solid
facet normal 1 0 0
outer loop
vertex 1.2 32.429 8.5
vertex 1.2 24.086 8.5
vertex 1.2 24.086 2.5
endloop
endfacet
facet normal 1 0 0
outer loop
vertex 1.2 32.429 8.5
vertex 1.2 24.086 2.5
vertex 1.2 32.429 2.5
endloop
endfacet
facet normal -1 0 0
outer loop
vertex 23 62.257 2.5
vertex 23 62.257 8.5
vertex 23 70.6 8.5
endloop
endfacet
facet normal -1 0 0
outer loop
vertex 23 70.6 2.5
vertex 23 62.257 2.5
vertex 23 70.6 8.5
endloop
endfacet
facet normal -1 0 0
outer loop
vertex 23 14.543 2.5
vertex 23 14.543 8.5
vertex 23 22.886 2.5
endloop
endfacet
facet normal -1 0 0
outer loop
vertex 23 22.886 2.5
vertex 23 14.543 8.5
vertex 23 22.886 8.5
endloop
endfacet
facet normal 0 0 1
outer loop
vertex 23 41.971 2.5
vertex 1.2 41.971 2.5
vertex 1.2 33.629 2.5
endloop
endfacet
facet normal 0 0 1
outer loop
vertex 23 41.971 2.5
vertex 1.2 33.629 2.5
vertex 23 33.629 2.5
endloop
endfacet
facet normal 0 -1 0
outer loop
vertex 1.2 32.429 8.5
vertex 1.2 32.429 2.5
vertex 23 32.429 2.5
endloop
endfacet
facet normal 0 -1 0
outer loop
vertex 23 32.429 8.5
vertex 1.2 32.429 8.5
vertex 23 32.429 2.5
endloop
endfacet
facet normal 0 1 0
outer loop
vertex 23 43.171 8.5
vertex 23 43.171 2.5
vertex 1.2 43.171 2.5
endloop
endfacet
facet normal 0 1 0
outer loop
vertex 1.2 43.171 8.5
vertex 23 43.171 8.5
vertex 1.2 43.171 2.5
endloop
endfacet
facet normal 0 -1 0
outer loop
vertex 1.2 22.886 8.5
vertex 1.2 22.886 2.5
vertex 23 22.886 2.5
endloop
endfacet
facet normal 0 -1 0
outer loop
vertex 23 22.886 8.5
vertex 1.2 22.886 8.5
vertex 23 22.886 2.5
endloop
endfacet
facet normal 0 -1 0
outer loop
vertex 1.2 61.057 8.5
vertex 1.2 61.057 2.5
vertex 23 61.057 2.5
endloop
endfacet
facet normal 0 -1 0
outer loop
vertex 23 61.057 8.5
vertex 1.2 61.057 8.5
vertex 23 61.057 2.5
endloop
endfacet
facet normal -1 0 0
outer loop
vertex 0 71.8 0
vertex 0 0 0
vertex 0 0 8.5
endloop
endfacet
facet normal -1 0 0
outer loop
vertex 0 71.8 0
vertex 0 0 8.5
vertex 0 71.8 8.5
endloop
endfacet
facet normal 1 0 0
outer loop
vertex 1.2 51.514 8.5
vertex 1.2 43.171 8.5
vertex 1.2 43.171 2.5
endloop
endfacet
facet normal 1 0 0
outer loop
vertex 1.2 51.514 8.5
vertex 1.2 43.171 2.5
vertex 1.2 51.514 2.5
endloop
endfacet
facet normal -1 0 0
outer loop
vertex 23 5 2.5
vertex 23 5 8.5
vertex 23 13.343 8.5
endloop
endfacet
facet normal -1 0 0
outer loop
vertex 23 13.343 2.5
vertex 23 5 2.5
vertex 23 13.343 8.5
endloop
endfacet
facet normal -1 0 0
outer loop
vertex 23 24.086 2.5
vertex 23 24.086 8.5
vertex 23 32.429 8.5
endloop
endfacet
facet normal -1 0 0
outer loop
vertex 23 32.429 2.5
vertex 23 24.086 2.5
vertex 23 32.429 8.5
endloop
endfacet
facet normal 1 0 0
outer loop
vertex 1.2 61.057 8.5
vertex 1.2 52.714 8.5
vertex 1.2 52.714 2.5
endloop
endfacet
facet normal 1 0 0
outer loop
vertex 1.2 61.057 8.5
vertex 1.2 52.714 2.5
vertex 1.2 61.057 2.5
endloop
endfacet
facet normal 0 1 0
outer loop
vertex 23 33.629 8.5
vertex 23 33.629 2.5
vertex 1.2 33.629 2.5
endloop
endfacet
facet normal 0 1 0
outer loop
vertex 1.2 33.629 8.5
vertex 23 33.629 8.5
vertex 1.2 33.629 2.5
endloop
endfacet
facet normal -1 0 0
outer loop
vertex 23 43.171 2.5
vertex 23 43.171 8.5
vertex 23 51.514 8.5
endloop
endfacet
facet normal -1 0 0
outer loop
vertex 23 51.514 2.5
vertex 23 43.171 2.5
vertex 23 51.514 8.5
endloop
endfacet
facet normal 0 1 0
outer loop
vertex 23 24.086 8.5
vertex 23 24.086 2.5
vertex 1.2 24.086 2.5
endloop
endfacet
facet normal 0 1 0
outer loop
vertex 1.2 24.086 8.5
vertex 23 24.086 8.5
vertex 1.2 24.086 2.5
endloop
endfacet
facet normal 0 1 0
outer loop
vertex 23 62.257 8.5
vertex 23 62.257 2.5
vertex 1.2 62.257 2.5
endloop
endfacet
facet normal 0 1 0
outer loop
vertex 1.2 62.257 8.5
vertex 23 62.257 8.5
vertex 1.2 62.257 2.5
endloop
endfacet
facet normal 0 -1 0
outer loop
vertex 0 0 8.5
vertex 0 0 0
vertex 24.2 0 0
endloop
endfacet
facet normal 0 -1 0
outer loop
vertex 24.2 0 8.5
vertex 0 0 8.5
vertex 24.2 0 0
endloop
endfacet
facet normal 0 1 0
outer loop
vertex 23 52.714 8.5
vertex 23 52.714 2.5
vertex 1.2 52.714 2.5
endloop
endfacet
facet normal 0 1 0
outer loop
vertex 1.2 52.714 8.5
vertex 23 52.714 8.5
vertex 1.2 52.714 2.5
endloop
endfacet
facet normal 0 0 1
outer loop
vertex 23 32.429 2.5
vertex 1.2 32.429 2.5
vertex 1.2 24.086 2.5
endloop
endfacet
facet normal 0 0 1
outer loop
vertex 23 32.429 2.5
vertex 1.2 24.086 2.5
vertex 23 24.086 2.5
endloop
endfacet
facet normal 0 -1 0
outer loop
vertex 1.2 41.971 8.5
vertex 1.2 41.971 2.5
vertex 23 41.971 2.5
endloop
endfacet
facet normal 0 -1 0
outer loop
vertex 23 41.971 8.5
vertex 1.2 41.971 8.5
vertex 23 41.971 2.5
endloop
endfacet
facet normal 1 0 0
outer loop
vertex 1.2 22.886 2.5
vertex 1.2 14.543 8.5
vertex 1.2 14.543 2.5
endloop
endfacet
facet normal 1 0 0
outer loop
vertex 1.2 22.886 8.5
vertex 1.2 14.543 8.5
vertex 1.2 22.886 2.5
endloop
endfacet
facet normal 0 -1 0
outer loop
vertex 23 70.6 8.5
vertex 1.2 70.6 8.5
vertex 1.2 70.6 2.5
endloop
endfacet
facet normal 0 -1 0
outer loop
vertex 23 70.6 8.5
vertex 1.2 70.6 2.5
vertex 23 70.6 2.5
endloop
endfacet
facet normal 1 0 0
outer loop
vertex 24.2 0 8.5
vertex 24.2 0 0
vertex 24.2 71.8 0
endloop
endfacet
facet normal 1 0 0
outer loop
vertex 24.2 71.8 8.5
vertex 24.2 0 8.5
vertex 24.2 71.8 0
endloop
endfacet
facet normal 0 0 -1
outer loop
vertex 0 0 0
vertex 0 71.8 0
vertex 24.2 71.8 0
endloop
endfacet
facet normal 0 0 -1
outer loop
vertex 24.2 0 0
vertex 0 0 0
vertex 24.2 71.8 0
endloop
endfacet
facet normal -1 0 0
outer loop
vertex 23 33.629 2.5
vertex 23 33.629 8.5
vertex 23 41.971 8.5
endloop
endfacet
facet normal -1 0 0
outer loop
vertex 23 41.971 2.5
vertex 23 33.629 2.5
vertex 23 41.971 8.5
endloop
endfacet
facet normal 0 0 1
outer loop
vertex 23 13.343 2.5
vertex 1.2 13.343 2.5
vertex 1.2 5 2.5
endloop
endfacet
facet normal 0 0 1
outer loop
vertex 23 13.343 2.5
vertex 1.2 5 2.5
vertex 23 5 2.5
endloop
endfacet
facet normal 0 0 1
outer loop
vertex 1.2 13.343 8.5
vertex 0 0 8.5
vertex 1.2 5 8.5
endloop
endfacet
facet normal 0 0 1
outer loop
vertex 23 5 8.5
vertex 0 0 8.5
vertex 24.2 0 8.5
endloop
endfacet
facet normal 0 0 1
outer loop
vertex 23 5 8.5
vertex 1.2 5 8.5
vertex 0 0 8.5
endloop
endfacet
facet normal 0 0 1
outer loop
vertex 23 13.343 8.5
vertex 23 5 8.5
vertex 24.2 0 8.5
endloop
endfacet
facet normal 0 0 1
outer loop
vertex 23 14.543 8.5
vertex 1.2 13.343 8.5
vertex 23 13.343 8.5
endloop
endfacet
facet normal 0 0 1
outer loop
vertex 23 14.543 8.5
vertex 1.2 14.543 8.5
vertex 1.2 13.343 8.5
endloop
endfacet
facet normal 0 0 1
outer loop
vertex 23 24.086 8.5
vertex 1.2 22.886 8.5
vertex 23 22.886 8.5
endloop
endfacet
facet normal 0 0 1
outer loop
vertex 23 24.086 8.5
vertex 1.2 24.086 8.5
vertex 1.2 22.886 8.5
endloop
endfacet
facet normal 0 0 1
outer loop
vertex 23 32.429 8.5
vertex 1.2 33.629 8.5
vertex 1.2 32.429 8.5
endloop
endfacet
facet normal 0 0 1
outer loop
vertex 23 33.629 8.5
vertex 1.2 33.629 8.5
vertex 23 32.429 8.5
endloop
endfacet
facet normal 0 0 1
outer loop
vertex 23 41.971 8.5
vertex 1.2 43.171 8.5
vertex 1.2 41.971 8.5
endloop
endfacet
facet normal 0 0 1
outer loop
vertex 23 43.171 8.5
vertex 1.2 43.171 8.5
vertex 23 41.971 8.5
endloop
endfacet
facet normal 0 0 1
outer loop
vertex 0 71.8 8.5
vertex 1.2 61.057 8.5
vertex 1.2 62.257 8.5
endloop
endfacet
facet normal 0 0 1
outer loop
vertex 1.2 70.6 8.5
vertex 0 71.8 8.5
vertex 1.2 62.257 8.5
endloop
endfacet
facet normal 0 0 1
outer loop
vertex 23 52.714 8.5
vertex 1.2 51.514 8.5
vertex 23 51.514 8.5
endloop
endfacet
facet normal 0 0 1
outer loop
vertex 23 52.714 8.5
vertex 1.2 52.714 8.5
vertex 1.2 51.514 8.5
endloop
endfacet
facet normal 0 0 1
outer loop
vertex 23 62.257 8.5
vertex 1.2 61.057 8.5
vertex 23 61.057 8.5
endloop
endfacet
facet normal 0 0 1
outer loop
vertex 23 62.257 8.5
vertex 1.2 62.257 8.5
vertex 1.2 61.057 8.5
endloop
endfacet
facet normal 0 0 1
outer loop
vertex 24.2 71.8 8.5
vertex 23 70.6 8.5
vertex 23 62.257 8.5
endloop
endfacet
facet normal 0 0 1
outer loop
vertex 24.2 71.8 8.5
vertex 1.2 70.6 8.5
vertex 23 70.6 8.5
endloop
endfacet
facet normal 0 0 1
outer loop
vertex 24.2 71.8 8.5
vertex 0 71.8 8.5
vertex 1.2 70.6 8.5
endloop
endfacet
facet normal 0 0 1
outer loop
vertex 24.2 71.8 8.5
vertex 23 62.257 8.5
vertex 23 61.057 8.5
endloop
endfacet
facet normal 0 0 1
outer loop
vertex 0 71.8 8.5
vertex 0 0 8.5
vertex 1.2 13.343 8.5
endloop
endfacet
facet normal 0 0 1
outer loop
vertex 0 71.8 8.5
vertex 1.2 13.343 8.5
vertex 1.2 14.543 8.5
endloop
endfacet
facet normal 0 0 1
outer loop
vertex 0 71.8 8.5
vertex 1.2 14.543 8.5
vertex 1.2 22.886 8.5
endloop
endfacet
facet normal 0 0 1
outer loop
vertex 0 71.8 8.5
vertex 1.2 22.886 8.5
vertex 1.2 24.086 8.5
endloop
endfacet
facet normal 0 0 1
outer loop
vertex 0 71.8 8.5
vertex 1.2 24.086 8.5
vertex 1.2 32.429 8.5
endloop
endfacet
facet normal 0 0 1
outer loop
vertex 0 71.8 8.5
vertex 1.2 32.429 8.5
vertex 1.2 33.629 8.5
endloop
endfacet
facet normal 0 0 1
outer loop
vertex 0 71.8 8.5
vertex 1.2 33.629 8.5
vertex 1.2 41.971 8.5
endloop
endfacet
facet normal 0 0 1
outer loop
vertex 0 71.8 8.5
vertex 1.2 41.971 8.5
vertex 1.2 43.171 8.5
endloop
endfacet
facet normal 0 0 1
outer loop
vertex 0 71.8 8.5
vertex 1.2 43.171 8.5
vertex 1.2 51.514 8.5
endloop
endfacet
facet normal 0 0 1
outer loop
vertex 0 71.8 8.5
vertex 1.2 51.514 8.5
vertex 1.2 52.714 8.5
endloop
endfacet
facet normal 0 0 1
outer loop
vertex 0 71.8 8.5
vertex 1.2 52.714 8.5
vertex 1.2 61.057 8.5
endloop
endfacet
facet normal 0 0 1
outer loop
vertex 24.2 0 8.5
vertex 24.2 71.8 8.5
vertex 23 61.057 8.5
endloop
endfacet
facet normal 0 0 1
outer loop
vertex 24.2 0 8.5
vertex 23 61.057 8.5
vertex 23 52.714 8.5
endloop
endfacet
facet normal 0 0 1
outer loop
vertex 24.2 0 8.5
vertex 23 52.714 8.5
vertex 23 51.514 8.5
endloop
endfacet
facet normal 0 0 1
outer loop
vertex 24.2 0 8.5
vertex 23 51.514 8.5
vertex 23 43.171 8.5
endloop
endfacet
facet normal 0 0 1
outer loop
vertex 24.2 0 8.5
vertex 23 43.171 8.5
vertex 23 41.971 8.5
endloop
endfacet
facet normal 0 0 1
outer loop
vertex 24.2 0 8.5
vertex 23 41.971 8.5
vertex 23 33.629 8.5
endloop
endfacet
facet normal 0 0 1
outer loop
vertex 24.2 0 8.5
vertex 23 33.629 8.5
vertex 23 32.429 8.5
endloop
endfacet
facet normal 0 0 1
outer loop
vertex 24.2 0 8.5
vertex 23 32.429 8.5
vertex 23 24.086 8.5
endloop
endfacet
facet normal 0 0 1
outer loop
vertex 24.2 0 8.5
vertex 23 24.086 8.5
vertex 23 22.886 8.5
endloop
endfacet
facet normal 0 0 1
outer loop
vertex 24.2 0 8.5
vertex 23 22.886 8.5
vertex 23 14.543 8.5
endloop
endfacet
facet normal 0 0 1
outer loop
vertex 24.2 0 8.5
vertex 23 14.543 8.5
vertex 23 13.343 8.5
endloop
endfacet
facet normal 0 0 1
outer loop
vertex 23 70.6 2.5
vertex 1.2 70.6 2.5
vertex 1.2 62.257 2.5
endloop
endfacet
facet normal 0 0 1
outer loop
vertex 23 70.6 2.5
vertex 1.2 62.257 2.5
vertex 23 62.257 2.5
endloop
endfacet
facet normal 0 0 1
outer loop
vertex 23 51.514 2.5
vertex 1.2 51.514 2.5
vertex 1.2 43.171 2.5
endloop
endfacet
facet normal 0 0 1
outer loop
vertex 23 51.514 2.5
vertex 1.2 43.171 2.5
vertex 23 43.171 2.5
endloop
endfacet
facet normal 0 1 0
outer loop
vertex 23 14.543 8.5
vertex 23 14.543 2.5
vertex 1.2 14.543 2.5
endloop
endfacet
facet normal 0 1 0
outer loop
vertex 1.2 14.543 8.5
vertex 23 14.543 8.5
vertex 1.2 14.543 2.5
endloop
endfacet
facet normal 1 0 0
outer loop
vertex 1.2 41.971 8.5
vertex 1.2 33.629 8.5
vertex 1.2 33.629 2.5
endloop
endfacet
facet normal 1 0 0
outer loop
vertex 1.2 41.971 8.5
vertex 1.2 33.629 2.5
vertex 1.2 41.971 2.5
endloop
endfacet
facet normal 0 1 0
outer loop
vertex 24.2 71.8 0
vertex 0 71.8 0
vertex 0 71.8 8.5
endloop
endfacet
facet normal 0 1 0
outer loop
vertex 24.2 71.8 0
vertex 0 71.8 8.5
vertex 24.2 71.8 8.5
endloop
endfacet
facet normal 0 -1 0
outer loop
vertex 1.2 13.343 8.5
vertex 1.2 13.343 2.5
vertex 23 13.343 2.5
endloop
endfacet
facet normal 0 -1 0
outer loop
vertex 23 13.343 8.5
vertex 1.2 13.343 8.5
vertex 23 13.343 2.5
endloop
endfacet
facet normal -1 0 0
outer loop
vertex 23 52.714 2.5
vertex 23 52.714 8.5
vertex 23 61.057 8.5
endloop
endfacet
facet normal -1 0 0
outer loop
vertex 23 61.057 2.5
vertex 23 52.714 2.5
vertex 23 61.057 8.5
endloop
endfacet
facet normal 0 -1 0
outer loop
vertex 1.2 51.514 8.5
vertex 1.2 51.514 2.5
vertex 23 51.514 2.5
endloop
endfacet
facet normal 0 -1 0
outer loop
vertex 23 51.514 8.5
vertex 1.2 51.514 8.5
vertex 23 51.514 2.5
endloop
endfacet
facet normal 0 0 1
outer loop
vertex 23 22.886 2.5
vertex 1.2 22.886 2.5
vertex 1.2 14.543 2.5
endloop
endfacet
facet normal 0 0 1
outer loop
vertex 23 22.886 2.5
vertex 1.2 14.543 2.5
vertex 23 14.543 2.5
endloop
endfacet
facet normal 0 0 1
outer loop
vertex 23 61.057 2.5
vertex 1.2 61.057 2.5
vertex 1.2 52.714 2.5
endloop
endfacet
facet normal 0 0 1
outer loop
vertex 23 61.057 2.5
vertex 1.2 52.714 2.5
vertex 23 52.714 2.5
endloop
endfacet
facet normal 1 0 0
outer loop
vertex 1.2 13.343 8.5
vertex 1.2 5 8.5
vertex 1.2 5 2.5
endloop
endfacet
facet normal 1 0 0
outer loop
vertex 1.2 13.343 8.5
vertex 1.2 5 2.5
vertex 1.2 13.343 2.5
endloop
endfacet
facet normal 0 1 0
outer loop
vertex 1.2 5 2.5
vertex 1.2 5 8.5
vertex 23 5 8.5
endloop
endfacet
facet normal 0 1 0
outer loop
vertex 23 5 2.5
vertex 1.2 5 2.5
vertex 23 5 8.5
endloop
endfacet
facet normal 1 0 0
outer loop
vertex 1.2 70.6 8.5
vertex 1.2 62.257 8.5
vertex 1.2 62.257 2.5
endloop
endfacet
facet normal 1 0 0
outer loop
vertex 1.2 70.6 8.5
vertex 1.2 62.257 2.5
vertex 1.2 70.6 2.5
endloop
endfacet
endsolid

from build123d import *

# Parameters (mm, degrees)
F0_W     = 24.2
F0_H     = 71.8
F1_DEPTH = 8.5
F2_W     = 21.8
F2_H     = 65.6
F3_DEPTH = 6
F5_DEPTH = 6


with BuildPart() as f1:
    # F0 (on Top) → F1 (new body)
    with BuildSketch(Plane.XY):
        with Locations((12.1, 35.9)):
            Rectangle(F0_W, F0_H)
    extrude(amount=F1_DEPTH)

    # F2 (on face) → F3 (cut)
    with BuildSketch(Plane.XY.offset(8.5)):
        with Locations((12.1, 37.8)):
            Rectangle(F2_W, F2_H)
    extrude(amount=-F3_DEPTH, mode=Mode.SUBTRACT)

    # F4 (on face) → F5 (join)
    with BuildSketch(Plane.XY.offset(2.5)):
        Polygon((11, 62.256824), (1.2, 62.256824), (1.2, 61.056824), (11, 61.056824), (12, 61.056824), (12.2, 61.056824), (13.2, 61.056824), (23, 61.056824), (23, 62.256824), (12.177438, 62.256824), (12.022562, 62.256824), align=None)
        Polygon((23, 51.514286), (23, 52.714286), (13.2, 52.714286), (12.2, 52.714286), (12, 52.714286), (11, 52.714286), (1.2, 52.714286), (1.2, 51.514286), (11, 51.514286), (12, 51.514286), (12.2, 51.514286), (13.2, 51.514286), align=None)
        Polygon((11, 43.171429), (1.2, 43.171429), (1.2, 41.971429), (11, 41.971429), (12, 41.971429), (12.2, 41.971429), (13.2, 41.971429), (23, 41.971429), (23, 43.171429), (13.2, 43.171429), (12.2, 43.171429), (12, 43.171429), align=None)
        Polygon((23, 32.428571), (23, 33.628571), (13.2, 33.628571), (12.2, 33.628571), (12, 33.628571), (11, 33.628571), (1.2, 33.628571), (1.2, 32.428571), (11, 32.428571), (12, 32.428571), (12.2, 32.428571), (13.2, 32.428571), align=None)
        Polygon((11, 24.085714), (1.2, 24.085714), (1.2, 22.885714), (11, 22.885714), (12, 22.885714), (12.2, 22.885714), (13.2, 22.885714), (23, 22.885714), (23, 24.085714), (13.2, 24.085714), (12.2, 24.085714), (12, 24.085714), align=None)
        Polygon((23, 13.342857), (23, 14.542857), (13.2, 14.542857), (12.2, 14.542857), (12, 14.542857), (11, 14.542857), (1.2, 14.542857), (1.2, 13.342857), (11, 13.342857), (12, 13.342857), (12.2, 13.342857), (13.2, 13.342857), align=None)
    extrude(amount=F5_DEPTH)


with BuildPart() as f6_1:
    # F6: copy of F1
    add(f1.part)


solid = f1.part
